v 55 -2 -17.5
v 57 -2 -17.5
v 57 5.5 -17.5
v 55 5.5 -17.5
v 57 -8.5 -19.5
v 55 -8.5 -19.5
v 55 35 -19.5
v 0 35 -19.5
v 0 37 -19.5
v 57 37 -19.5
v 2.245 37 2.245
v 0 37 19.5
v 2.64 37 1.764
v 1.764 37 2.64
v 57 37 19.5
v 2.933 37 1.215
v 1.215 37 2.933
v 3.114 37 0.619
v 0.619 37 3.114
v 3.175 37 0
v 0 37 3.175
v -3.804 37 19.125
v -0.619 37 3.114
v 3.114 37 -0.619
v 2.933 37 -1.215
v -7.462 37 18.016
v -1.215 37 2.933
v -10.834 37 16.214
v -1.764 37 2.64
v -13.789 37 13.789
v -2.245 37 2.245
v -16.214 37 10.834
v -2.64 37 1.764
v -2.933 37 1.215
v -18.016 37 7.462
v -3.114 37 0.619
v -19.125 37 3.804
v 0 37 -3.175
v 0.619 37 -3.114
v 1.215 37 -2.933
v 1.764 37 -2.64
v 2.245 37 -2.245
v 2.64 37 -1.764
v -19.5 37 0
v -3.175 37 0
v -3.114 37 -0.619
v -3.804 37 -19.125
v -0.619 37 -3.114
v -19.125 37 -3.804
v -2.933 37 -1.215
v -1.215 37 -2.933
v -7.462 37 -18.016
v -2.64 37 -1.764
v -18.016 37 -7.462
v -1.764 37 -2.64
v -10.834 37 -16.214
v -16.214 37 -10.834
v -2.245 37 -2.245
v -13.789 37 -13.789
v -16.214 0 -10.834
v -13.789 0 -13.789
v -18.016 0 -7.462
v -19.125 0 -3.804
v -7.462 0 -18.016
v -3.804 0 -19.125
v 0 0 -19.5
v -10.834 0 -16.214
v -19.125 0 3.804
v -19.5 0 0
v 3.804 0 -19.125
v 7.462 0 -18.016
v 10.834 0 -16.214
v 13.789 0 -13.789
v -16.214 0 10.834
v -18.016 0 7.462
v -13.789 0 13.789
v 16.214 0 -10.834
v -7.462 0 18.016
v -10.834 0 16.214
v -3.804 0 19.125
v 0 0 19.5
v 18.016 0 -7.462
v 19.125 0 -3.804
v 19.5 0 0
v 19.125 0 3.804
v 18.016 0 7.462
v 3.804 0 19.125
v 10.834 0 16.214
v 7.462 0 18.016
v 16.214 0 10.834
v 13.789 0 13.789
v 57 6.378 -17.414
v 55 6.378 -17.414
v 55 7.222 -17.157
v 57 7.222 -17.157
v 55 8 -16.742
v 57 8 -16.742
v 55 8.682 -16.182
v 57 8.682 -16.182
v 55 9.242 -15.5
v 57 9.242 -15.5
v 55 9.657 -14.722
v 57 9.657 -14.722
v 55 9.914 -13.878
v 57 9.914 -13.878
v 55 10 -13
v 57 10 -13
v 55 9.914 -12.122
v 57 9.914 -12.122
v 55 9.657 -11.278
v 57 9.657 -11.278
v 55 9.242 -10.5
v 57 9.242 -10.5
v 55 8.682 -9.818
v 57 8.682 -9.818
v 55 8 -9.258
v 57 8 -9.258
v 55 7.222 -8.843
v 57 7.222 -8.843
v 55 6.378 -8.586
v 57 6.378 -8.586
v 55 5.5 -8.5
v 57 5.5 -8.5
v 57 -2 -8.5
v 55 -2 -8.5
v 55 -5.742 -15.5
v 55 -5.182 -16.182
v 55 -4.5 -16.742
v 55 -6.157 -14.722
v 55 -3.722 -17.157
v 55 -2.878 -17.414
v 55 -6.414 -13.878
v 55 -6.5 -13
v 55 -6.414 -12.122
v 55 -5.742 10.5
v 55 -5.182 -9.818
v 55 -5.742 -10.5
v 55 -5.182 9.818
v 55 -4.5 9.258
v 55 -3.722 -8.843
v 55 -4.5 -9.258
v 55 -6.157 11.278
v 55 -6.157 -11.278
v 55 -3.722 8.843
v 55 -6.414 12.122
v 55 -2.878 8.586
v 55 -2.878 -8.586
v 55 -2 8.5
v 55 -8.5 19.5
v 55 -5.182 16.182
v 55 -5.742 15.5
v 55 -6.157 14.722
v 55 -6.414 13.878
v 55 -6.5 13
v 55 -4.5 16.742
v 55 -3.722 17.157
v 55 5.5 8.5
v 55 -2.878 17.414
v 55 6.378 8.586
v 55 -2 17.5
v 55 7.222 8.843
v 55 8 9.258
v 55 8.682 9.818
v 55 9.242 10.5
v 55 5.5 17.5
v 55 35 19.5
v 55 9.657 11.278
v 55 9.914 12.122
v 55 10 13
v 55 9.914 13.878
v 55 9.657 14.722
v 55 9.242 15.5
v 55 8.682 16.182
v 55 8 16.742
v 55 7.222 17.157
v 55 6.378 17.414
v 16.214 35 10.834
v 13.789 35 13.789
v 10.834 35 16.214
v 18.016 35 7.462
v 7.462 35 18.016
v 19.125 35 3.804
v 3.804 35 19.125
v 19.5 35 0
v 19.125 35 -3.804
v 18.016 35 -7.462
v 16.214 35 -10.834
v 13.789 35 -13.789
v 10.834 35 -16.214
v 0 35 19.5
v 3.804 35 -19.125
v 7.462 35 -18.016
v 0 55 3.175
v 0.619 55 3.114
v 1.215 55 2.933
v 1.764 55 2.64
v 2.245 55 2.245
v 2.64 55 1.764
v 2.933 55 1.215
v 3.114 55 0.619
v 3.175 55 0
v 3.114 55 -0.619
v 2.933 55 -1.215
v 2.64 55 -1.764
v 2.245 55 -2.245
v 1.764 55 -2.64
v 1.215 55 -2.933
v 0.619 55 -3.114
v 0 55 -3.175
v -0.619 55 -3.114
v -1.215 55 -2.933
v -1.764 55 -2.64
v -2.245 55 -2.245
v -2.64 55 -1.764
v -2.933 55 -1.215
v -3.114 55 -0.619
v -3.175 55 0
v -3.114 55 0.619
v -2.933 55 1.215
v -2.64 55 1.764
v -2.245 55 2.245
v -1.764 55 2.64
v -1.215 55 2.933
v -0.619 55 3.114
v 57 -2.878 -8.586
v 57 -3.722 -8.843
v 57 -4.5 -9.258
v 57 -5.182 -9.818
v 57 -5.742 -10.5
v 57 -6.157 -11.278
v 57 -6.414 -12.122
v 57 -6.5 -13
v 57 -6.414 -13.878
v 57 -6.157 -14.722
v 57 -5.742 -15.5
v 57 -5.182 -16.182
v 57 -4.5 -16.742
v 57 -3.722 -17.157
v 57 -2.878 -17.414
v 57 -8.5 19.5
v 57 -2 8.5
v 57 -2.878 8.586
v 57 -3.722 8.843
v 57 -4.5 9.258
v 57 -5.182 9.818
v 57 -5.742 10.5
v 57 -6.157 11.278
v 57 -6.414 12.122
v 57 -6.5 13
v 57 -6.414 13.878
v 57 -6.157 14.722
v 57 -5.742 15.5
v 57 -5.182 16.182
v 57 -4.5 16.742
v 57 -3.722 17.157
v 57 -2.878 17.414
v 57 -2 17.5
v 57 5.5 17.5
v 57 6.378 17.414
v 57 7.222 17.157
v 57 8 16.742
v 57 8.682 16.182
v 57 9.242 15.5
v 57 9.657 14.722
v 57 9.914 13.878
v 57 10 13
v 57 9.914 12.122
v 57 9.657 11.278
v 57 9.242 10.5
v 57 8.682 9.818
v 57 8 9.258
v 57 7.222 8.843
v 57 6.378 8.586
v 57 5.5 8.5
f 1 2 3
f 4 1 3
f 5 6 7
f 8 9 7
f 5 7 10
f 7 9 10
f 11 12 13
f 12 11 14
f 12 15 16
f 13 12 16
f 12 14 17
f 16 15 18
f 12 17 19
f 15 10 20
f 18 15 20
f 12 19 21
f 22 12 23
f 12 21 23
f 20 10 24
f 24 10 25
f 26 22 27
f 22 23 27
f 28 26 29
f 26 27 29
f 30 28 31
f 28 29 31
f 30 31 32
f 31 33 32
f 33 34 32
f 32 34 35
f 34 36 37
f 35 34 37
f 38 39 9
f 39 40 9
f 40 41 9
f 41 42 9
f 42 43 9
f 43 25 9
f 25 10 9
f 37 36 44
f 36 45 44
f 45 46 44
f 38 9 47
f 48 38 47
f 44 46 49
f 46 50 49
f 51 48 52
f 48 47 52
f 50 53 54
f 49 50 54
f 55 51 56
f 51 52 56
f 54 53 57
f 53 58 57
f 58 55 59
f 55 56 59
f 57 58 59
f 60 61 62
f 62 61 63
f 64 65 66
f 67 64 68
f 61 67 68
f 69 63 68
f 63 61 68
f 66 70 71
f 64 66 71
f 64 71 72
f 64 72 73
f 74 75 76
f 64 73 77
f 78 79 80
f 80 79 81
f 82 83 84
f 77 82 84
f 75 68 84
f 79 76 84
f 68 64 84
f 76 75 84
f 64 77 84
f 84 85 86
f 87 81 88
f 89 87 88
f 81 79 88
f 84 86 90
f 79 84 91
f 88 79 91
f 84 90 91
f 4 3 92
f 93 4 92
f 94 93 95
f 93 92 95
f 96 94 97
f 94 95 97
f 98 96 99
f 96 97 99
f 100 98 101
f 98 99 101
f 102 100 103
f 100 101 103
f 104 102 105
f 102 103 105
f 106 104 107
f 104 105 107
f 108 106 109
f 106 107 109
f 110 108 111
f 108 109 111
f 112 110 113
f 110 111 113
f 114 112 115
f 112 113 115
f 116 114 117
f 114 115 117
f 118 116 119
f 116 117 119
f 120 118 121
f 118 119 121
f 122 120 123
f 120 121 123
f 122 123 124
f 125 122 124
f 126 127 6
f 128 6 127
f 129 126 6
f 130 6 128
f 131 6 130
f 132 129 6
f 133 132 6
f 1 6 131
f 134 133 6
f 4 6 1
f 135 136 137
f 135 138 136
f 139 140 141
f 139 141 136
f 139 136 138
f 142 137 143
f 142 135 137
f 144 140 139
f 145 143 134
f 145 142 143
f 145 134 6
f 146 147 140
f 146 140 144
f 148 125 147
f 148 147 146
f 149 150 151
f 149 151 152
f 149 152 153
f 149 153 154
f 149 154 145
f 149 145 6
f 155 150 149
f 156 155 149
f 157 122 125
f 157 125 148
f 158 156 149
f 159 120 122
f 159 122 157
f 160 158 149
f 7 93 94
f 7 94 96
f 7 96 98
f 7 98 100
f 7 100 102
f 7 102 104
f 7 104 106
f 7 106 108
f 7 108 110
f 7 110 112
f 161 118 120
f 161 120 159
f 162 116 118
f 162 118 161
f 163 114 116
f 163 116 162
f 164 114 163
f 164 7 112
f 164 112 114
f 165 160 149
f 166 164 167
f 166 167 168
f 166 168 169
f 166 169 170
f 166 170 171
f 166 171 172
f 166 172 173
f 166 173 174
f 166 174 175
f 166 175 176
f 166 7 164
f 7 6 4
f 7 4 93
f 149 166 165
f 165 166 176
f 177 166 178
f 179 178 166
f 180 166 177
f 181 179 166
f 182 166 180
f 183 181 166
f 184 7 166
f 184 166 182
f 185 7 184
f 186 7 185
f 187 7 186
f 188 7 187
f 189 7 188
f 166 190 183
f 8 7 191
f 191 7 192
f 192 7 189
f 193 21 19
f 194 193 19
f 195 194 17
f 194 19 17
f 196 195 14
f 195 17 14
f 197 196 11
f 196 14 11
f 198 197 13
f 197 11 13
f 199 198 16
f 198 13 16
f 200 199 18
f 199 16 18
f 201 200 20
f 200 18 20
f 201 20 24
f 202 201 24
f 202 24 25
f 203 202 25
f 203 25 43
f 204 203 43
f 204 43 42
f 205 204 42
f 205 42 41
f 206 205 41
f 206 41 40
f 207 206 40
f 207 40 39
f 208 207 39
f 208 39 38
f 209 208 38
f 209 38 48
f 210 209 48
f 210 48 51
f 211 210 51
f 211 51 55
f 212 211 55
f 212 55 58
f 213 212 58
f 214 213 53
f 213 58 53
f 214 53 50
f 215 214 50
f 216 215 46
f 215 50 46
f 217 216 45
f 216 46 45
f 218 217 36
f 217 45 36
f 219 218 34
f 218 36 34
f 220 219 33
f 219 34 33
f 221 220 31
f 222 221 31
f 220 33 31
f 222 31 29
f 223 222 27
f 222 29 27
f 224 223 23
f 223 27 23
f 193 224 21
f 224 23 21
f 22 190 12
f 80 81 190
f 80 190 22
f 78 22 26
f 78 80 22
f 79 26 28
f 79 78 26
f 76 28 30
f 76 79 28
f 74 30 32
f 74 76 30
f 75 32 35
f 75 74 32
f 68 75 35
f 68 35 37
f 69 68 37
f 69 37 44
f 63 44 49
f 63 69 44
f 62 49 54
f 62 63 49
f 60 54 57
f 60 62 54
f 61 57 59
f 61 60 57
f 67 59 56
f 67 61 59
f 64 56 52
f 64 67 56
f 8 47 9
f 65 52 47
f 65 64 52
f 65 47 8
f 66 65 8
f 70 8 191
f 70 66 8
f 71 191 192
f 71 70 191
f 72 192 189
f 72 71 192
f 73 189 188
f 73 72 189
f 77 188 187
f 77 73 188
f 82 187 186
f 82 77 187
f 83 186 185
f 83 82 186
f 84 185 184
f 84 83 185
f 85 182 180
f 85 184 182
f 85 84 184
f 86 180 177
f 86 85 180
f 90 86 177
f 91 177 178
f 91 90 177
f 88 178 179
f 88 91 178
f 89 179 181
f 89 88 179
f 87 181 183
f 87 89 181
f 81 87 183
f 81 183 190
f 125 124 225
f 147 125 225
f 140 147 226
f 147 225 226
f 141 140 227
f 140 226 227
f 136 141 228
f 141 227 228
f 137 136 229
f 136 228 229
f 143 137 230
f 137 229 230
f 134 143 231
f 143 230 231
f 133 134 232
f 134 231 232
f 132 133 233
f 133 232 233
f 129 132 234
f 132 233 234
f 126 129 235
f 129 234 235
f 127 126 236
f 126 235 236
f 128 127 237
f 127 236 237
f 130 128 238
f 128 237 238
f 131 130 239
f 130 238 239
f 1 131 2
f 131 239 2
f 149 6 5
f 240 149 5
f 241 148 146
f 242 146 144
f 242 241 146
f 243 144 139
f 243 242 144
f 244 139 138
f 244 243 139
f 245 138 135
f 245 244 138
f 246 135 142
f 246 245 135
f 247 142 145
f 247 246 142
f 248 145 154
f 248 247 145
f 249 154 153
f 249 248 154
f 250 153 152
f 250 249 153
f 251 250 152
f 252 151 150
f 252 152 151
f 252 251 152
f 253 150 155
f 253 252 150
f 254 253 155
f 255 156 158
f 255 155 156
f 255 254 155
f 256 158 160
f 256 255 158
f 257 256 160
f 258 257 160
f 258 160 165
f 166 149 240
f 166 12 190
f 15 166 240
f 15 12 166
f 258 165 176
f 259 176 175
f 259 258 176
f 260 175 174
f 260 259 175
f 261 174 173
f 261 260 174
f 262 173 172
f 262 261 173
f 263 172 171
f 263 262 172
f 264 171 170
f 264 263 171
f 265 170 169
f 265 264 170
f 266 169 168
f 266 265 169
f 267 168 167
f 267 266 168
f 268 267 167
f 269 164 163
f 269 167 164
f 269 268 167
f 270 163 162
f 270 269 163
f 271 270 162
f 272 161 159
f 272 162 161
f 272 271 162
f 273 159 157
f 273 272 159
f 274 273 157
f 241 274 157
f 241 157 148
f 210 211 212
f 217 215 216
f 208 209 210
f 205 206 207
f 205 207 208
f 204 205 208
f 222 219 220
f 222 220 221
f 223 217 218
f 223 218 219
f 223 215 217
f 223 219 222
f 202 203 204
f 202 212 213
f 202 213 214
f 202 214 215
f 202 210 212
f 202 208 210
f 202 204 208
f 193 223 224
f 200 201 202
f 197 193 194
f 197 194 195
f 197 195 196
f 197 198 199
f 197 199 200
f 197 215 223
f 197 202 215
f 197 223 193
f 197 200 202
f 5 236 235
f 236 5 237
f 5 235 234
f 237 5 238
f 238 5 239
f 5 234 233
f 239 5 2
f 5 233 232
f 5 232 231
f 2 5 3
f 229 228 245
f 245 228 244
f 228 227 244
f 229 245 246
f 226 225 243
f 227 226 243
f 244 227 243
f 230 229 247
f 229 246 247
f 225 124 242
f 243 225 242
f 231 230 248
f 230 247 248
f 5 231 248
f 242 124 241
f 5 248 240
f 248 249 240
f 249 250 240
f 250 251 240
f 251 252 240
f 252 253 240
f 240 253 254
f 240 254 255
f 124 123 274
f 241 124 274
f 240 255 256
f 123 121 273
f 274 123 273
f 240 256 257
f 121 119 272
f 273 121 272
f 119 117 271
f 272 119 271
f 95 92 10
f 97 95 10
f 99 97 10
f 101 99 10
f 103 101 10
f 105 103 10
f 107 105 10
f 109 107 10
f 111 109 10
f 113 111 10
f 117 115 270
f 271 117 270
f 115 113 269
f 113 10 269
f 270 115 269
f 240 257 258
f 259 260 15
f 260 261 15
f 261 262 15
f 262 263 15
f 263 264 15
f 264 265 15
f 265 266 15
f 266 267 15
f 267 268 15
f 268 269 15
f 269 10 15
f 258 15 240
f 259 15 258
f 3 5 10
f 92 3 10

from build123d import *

# Parameters (mm, degrees)
ESQUISSE1_R             = 19.5
BOSS_EXTRU_1_DEPTH      = 35
ESQUISSE2_R             = 3.175
BOSS_EXTRU_2_DEPTH      = 20
BOSS_EXTRU_3_DEPTH      = 2
ESQUISSE5_W             = 2
ESQUISSE5_H             = 39
BOSS_EXTRU_4_DEPTH      = 43.5
ENL_V_MAT_EXTRU_1_DEPTH = 5


with BuildPart() as part:
    # Esquisse1 → Boss.-Extru.1 (new body)
    with BuildSketch(Plane(origin=(0, 0, 0), x_dir=(1, 0, 0), z_dir=(0, 1, 0))):
        with Locations(Location((0, 0, 0), (0, 0, 270))):
            Circle(ESQUISSE1_R)
    extrude(amount=BOSS_EXTRU_1_DEPTH)

    # Esquisse2 → Boss.-Extru.2 (add)
    with BuildSketch(Plane(origin=(0, 35, 0), x_dir=(1, 0, 0), z_dir=(0, 1, 0))):
        with Locations(Location((0, 0, 0), (0, 0, 270))):
            Circle(ESQUISSE2_R)
    extrude(amount=BOSS_EXTRU_2_DEPTH)

    # Esquisse4 → Boss.-Extru.3 (add)
    with BuildSketch(Plane(origin=(0, 35, 0), x_dir=(1, 0, 0), z_dir=(0, 1, 0))):
        with BuildLine():
            Line((0, 19.5), (57, 19.5))
            Line((57, 19.5), (57, -19.5))
            Line((57, -19.5), (0, -19.5))
            ThreePointArc((0, -19.5), (-19.5, 0), (0, 19.5))
        make_face()
    extrude(amount=BOSS_EXTRU_3_DEPTH)

    # Esquisse5 → Boss.-Extru.4 (add)
    with BuildSketch(Plane.XZ.offset(-35)):
        with Locations((56, 0)):
            Rectangle(ESQUISSE5_W, ESQUISSE5_H)
    extrude(amount=BOSS_EXTRU_4_DEPTH)

    # Esquisse6 → Enlèv. mat.-Extru.1 (cut)
    with BuildSketch(Plane(origin=(57, 0, 0), x_dir=(0, 0, -1), z_dir=(1, 0, 0))):
        with BuildLine():
            Line((-8.5, 5.5), (-8.5, -2))
            ThreePointArc((-8.5, -2), (-13, -6.5), (-17.5, -2))
            Line((-17.5, -2), (-17.5, 5.5))
            ThreePointArc((-17.5, 5.5), (-13, 10), (-8.5, 5.5))
        make_face()
        with BuildLine():
            Line((8.5, 5.5), (8.5, -2))
            ThreePointArc((8.5, -2), (13, -6.5), (17.5, -2))
            Line((17.5, -2), (17.5, 5.5))
            ThreePointArc((17.5, 5.5), (13, 10), (8.5, 5.5))
        make_face()
    extrude(amount=-ENL_V_MAT_EXTRU_1_DEPTH, mode=Mode.SUBTRACT)


solid = part.part
